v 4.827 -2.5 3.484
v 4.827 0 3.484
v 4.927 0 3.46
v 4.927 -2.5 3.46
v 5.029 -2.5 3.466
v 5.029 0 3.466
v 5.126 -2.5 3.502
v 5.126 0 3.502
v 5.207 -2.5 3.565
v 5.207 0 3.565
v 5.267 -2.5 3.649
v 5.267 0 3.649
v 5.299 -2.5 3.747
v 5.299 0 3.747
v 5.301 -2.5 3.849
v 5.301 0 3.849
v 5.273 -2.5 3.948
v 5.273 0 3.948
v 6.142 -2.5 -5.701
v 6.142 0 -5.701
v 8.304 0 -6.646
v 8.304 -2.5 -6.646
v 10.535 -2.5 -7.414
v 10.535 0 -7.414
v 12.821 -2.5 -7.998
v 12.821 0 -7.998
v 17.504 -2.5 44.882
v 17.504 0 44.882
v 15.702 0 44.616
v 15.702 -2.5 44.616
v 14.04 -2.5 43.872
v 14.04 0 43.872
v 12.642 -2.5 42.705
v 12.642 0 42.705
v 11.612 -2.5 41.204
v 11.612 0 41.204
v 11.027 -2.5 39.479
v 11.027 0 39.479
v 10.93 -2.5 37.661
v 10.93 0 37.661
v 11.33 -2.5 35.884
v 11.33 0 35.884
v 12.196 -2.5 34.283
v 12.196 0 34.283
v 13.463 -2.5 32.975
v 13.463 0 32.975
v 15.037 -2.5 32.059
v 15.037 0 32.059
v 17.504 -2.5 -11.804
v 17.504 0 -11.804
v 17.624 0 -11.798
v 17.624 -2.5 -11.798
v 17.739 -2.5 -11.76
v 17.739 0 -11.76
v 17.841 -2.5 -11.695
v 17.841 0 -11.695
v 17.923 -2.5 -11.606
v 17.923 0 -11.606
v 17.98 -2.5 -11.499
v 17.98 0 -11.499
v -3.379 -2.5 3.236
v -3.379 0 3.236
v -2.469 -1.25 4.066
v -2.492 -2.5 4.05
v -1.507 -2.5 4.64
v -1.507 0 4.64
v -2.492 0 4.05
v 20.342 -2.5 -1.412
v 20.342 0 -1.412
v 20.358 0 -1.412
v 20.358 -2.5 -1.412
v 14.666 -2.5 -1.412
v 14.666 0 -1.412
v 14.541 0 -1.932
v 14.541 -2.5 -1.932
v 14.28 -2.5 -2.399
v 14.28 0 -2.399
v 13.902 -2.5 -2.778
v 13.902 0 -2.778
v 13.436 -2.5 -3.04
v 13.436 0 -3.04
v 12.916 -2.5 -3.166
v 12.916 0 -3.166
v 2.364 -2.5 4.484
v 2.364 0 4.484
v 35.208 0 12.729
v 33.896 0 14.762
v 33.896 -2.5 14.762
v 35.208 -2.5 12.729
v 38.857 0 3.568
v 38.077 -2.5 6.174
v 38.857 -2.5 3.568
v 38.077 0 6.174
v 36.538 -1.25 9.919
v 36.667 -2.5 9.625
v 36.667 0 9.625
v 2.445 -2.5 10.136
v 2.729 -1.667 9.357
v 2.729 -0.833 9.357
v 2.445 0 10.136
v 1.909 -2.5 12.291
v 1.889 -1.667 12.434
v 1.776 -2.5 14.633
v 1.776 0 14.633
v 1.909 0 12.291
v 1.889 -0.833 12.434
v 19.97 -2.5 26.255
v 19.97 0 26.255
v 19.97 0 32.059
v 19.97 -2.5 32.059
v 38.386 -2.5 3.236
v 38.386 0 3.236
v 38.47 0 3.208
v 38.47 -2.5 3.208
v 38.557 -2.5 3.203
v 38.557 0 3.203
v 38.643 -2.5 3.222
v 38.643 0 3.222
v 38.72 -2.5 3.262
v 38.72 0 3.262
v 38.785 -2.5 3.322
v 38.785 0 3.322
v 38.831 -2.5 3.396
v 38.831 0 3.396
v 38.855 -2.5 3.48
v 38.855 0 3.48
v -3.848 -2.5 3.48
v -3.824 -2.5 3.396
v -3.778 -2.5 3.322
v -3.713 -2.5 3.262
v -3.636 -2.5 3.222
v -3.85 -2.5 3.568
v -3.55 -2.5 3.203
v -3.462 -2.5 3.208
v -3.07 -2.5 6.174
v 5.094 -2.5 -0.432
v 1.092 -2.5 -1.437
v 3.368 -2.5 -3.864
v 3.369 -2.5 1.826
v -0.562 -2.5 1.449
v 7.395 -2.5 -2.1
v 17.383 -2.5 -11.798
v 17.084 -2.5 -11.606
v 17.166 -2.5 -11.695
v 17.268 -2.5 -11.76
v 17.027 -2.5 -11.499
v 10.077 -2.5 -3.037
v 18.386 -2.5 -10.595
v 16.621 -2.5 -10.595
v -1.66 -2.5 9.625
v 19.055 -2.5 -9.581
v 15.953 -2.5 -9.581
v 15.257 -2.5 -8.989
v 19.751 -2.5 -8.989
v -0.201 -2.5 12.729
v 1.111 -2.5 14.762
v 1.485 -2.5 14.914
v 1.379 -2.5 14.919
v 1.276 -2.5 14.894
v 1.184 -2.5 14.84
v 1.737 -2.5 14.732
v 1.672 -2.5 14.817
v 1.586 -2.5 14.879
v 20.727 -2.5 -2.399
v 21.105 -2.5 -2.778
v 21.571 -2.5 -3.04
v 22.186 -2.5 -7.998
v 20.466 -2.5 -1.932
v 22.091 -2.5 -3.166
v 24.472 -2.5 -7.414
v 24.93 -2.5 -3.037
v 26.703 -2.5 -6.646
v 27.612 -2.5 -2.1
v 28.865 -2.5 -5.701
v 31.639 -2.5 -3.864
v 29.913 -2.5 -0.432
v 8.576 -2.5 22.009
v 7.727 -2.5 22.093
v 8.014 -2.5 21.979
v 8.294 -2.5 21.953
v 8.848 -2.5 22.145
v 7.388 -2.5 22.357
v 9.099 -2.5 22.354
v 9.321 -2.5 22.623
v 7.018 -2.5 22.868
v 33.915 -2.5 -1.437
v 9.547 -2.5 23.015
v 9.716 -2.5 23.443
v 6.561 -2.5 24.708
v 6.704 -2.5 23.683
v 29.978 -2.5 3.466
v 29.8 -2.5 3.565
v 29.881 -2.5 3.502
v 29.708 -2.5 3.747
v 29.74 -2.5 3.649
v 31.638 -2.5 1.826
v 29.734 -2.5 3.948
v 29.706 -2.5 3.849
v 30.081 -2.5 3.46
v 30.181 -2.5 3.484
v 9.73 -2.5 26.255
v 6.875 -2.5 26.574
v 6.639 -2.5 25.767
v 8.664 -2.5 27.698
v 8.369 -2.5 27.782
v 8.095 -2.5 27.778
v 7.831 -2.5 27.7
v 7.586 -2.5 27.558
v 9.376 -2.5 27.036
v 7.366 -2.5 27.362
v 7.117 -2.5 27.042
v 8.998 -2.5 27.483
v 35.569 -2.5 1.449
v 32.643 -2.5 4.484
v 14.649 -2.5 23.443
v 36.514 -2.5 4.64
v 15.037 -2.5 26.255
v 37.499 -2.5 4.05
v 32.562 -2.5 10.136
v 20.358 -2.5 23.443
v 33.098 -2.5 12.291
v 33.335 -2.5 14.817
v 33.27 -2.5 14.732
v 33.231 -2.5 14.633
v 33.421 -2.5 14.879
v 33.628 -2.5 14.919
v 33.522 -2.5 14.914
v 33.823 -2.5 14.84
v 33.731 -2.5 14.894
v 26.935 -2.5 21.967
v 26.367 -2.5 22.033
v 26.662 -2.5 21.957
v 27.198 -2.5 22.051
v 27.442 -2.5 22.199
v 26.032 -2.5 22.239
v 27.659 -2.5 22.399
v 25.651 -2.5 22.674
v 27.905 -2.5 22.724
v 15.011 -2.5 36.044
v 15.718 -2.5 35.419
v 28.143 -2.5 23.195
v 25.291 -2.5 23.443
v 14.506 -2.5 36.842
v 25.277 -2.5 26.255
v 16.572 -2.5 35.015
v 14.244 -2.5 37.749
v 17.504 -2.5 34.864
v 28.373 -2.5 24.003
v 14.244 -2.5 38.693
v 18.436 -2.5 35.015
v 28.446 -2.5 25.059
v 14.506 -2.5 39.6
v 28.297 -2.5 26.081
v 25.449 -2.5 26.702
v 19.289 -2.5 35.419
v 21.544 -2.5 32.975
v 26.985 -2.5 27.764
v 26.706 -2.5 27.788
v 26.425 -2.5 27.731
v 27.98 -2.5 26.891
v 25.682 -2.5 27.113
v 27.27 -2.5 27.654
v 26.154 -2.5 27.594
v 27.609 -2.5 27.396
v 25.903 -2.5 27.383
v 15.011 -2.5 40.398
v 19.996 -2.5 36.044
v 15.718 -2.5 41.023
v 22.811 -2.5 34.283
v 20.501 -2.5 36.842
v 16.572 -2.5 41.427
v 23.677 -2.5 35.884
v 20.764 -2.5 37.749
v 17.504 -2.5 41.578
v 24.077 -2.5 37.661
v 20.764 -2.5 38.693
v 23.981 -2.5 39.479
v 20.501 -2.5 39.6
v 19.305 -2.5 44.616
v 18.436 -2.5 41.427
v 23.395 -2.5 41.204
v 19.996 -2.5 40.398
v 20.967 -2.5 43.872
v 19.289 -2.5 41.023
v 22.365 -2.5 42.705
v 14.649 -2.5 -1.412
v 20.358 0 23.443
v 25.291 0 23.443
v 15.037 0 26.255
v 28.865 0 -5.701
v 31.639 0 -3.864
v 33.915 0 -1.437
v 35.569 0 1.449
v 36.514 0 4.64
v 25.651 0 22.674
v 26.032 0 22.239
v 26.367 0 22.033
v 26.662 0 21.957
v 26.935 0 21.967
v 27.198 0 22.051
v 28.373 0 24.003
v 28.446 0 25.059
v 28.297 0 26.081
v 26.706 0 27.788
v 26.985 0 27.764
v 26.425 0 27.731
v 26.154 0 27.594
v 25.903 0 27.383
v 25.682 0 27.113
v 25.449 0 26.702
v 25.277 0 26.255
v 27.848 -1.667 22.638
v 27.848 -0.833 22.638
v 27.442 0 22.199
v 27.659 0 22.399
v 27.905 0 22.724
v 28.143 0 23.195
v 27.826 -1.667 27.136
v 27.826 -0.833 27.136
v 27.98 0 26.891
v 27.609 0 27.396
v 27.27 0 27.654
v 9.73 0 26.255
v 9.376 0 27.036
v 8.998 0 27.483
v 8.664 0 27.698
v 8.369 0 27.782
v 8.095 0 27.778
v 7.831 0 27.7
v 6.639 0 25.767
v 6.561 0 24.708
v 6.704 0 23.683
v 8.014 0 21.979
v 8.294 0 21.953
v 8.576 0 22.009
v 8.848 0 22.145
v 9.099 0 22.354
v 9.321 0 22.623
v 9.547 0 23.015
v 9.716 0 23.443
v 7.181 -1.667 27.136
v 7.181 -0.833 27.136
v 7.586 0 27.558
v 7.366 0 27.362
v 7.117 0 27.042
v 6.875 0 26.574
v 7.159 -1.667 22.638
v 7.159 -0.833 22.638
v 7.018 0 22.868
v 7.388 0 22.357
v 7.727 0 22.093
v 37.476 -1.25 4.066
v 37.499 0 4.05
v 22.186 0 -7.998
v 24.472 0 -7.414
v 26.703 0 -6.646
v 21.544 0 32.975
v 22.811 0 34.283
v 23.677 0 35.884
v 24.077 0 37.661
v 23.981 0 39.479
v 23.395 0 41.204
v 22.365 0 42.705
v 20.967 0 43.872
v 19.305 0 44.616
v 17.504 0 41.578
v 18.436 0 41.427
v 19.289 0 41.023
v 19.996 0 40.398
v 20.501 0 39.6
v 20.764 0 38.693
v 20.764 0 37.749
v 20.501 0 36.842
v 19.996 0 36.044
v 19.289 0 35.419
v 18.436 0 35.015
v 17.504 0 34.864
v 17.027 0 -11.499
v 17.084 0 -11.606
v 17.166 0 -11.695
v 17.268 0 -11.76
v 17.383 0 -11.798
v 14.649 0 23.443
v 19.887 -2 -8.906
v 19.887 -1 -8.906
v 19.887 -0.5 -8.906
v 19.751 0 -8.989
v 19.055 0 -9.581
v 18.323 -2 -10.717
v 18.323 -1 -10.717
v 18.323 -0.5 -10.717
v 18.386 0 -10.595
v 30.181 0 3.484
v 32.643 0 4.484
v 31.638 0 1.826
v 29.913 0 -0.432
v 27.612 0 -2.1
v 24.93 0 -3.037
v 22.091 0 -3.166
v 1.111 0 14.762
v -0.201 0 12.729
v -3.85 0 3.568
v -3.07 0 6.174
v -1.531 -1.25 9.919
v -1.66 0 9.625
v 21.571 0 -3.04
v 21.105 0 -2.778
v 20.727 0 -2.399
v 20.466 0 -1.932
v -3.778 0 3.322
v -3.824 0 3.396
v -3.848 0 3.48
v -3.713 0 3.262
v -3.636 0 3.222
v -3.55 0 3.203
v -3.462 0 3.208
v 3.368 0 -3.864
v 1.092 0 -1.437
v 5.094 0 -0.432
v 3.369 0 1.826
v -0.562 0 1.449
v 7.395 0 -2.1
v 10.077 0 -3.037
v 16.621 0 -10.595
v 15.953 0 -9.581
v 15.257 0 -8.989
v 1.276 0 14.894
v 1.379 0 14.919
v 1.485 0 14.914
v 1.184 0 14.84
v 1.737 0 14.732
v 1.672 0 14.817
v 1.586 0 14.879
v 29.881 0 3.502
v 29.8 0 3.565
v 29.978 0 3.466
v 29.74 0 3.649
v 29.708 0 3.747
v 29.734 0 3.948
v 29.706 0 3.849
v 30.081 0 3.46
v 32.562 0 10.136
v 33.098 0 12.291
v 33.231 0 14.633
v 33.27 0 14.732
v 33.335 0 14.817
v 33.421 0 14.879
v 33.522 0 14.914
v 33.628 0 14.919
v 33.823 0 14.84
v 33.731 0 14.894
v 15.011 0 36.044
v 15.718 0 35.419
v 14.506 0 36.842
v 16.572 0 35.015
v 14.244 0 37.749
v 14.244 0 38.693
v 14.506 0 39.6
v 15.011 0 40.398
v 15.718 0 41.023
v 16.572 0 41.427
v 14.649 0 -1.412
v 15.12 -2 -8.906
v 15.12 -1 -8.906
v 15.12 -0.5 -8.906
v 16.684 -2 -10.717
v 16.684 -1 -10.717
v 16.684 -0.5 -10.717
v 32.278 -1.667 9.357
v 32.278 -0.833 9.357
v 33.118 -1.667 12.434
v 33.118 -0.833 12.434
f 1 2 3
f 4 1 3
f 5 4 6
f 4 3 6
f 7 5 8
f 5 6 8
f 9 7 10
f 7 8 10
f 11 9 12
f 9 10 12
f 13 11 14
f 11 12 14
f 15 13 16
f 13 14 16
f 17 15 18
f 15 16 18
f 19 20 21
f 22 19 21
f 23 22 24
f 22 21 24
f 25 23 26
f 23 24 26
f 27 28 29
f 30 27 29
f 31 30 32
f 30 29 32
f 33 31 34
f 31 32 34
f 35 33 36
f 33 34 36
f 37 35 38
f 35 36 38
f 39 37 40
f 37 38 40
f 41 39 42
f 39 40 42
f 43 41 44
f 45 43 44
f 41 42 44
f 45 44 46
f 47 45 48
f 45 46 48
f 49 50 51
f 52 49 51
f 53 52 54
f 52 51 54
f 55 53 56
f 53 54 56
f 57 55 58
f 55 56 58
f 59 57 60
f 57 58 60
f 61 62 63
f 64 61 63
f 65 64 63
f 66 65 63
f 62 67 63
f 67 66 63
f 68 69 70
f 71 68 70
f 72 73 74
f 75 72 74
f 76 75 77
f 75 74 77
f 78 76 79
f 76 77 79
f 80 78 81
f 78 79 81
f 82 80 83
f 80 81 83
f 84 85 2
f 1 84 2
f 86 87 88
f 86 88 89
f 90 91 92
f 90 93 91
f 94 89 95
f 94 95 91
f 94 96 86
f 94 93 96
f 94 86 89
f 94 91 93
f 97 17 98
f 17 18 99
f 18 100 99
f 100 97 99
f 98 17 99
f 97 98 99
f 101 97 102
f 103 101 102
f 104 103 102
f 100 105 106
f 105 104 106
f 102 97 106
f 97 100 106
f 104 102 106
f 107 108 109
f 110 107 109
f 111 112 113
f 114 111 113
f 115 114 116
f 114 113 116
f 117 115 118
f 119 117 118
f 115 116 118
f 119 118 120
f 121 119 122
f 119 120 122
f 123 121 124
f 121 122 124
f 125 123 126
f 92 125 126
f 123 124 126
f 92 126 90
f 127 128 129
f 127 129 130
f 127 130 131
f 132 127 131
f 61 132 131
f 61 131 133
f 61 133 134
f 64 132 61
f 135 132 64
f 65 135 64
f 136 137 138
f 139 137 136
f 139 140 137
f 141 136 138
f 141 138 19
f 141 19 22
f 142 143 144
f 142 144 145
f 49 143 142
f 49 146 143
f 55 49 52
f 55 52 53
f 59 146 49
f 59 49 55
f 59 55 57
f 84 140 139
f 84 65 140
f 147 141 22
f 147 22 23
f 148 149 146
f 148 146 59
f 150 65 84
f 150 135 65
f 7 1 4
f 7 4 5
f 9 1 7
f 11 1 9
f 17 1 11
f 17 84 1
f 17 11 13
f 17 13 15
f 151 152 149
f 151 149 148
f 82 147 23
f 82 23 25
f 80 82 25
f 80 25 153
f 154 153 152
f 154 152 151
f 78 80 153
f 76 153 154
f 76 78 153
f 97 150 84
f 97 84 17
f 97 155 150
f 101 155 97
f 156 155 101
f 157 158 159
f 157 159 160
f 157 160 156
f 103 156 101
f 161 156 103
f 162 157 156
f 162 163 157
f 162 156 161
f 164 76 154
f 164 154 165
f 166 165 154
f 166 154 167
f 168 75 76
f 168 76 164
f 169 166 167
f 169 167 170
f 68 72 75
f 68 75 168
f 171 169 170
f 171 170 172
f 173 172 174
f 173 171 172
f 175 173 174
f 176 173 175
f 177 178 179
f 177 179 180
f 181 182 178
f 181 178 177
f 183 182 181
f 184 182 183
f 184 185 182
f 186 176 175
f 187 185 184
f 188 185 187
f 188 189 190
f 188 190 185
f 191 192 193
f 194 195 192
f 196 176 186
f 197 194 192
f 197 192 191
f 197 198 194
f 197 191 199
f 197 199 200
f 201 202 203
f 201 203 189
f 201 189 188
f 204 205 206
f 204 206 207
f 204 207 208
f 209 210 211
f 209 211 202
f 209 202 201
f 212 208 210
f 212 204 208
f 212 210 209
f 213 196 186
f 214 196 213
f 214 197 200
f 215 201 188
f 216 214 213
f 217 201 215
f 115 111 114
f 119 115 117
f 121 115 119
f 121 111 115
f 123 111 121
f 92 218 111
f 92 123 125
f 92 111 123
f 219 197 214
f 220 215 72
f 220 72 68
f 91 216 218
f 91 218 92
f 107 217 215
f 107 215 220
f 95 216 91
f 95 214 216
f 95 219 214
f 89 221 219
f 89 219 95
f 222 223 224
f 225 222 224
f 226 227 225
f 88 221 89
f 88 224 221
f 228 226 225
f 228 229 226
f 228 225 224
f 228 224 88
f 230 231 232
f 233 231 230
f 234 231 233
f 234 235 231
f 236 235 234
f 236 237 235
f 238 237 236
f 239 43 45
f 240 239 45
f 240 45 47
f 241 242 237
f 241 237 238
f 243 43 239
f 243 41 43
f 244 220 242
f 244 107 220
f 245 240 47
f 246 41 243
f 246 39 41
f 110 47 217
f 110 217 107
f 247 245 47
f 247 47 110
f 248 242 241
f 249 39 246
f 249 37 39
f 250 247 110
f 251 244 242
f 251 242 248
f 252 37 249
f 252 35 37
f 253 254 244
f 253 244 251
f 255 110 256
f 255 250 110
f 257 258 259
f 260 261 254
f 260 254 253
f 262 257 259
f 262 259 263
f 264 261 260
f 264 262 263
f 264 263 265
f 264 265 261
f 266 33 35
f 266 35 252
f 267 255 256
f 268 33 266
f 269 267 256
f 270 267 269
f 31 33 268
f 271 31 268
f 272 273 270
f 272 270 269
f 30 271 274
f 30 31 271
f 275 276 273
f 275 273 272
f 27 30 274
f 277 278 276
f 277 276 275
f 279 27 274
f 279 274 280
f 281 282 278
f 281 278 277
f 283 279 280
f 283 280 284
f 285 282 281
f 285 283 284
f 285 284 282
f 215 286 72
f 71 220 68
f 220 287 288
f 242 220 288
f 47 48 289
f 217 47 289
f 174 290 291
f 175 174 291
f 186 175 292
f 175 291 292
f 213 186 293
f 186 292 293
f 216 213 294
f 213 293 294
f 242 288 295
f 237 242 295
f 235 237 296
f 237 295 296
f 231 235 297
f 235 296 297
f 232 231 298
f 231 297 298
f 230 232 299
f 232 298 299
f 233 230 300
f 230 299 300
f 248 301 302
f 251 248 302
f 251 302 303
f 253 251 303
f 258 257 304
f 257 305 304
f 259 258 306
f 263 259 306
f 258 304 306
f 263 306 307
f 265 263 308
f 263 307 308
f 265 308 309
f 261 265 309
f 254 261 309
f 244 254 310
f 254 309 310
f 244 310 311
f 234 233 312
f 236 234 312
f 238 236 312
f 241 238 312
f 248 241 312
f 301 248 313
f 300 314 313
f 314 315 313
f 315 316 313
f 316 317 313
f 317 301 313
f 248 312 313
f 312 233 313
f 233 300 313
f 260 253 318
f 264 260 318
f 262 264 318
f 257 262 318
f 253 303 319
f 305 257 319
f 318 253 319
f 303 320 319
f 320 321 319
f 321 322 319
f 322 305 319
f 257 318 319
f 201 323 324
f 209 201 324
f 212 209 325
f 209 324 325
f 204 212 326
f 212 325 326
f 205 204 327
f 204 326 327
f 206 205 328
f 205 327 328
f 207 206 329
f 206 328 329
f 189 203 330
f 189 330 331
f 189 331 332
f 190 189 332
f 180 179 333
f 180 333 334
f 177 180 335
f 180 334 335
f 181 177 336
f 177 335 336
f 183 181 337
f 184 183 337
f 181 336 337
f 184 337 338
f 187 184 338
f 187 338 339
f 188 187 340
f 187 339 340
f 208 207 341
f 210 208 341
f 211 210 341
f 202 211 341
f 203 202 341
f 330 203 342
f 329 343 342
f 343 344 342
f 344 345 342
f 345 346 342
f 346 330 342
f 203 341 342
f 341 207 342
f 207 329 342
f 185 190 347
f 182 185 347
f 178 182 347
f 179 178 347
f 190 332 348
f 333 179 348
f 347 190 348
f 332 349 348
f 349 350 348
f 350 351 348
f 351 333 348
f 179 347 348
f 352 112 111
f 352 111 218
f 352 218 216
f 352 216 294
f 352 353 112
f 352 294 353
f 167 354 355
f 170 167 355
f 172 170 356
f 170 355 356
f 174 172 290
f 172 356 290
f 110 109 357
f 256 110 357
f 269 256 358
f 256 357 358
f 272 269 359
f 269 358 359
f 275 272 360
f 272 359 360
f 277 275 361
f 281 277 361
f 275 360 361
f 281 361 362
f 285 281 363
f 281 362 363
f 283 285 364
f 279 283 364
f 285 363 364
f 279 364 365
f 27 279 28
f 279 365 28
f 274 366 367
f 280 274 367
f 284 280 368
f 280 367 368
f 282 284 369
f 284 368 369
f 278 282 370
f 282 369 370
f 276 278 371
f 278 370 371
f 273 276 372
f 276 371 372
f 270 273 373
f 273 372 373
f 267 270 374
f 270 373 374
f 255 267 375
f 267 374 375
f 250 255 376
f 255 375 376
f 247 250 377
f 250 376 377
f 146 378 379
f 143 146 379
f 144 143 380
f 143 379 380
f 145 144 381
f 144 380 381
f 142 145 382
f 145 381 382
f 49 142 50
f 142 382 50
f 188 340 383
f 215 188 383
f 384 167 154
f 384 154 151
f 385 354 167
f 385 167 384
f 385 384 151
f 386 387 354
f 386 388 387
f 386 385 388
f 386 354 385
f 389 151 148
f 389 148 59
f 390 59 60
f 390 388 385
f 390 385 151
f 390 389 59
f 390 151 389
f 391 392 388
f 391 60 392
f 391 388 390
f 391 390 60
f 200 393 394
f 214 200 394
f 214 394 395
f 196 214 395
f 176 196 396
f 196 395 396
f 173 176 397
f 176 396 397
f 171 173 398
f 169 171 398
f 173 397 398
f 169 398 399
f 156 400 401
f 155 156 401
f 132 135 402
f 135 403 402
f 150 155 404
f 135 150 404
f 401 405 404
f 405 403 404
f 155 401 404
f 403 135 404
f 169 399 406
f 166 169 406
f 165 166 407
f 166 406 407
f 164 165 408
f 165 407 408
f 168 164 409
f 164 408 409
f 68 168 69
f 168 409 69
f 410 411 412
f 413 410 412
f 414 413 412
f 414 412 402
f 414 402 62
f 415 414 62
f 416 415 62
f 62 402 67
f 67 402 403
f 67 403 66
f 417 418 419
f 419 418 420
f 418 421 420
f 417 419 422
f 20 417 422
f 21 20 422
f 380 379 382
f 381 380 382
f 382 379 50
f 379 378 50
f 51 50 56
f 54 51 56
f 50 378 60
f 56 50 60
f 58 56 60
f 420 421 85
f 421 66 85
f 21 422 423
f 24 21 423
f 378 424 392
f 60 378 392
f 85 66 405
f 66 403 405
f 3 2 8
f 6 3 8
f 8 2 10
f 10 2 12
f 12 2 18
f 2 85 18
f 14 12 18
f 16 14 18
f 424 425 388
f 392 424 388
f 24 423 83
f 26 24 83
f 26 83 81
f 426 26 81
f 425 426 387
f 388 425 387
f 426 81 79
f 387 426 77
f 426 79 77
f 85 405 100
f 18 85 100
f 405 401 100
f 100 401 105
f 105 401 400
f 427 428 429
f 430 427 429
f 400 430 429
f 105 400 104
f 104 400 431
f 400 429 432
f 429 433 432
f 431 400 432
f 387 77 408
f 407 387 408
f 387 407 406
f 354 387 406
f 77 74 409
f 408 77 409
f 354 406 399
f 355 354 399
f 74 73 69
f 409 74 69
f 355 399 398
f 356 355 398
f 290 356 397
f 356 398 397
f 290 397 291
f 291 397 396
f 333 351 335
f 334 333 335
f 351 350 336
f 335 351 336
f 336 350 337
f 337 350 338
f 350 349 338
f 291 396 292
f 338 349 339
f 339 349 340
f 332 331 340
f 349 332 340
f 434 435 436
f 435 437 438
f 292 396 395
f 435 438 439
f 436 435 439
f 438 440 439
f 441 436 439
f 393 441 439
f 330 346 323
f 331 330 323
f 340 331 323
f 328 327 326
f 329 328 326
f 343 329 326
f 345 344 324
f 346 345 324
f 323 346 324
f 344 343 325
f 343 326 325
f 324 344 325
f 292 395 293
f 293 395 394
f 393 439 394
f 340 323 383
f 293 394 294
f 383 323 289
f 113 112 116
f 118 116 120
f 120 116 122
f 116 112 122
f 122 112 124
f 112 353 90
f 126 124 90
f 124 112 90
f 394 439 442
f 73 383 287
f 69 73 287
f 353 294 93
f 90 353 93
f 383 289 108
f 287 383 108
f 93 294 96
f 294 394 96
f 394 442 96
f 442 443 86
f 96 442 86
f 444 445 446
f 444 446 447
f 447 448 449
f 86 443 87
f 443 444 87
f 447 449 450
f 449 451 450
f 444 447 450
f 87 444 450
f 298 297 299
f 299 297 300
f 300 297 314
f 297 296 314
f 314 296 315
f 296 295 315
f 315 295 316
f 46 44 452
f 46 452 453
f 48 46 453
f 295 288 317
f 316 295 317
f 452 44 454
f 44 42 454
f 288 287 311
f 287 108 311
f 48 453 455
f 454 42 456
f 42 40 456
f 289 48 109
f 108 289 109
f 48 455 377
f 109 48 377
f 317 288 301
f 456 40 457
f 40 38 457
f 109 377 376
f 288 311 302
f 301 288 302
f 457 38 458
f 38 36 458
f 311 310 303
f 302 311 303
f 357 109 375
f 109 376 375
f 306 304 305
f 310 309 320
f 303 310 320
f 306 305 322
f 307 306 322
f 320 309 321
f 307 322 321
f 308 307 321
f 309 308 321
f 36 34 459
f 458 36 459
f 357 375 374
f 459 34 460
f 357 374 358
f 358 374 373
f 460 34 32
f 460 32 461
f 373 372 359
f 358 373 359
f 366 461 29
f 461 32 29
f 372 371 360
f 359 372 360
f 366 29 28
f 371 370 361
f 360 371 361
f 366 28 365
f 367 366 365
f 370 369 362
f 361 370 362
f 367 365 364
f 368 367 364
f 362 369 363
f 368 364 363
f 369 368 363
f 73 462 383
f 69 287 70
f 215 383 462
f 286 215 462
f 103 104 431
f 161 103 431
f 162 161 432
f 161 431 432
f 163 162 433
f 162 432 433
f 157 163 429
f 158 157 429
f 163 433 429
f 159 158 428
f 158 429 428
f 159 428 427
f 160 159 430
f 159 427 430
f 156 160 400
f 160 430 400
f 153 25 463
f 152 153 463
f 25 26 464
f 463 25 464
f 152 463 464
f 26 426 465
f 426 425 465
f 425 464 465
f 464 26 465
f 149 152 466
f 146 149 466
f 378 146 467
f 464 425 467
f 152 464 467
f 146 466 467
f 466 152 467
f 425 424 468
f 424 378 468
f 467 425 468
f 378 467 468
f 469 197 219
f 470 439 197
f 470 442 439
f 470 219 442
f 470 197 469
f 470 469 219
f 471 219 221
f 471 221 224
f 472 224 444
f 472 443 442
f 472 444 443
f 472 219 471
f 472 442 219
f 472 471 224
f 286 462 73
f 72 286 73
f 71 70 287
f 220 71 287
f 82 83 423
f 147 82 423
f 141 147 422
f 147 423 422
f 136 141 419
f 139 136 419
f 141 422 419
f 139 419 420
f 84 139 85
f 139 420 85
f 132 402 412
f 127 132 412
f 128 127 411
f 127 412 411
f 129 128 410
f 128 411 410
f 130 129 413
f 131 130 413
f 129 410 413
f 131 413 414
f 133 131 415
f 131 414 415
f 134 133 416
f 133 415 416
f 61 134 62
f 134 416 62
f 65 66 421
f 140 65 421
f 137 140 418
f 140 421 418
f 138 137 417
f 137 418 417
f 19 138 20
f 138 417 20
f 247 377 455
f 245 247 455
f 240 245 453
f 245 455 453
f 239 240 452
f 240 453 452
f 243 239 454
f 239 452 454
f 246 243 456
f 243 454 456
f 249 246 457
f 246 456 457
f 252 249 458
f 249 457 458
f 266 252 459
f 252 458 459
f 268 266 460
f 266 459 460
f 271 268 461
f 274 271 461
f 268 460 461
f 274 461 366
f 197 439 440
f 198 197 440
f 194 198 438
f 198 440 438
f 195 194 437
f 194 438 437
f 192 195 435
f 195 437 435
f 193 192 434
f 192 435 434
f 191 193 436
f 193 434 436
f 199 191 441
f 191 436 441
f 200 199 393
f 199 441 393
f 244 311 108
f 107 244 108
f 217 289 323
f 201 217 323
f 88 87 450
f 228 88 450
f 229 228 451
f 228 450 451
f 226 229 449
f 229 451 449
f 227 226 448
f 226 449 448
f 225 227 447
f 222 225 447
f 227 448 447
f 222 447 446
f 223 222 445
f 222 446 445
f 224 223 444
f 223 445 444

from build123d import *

# Parameters (mm, degrees)
F1_DEPTH = 2.5


with BuildPart() as f1:
    # F0 (on Front) → F1 (new body)
    with BuildSketch(Plane.XZ):
        Polygon((19.9702170016, 32.0593795983), (15.0368500231, 32.0593795983), (15.0368500231, 26.2546902991), (9.737966444, 26.2546902991), (9.7163520504, 23.4430860728), (14.649162069, 23.4430860728), (14.649162069, -1.4119866537), (14.6655309945, -1.4119866537), (20.3415360302, -1.4119866537), (20.3579049557, -1.4119866537), (20.3579049557, 23.4430860728), (25.2907149743, 23.4430860728), (25.2767818304, 26.2546902991), (25.2691005807, 26.2546902991), (19.9702170016, 26.2546902991), align=None)
        with BuildLine():
            add(Edge.make_bspline(
                [(25.2907149743, 23.4430860728), (26.2882305831, 20.365262945), (27.8484616427, 22.637675937), (29.4086927023, 24.9100889291), (27.8261704411, 27.1358736943), (26.2436481799, 29.3616584594), (25.2767818304, 26.2546902991)],
                knots=[2.0818835057, 2.0818835057, 2.0818835057, 3.8412701203, 3.8412701203, 5.6006567348, 5.6006567348, 7.3600433494, 7.3600433494, 7.3600433494], degree=2, weights=[1, 0.6373874942, 1, 0.6373874942, 1, 0.6373874942, 1]))
            Line((25.2767818304, 26.2546902991), (25.2907149743, 23.4430860728))
        make_face()
        with BuildLine():
            ThreePointArc((19.9702170016, 32.0593795983), (23.9805343506, 39.4793828594), (17.5035335124, 44.8819335324))
            ThreePointArc((17.5035335124, 44.8819335324), (11.0265326741, 39.4793828594), (15.0368500231, 32.0593795983))
            Line((15.0368500231, 32.0593795983), (19.9702170016, 32.0593795983))
        make_face()
        with BuildLine():
            ThreePointArc((17.5035335124, 34.864031021), (14.2101902268, 38.22103329), (17.5035335124, 41.578035559))
            ThreePointArc((17.5035335124, 41.578035559), (20.796876798, 38.22103329), (17.5035335124, 34.864031021))
        make_face(mode=Mode.SUBTRACT)
        with BuildLine():
            Line((9.7163520504, 23.4430860728), (9.737966444, 26.2546902991))
            Line((9.737966444, 26.2546902991), (9.7302851943, 26.2546902991))
            add(Edge.make_bspline(
                [(9.7302851943, 26.2546902991), (8.7634188448, 29.3616584594), (7.1808965836, 27.1358736943), (5.5983743224, 24.9100889291), (7.158605382, 22.637675937), (8.7188364416, 20.365262945), (9.7163520504, 23.4430860728)],
                knots=[5.206327265, 5.206327265, 5.206327265, 6.9657138795, 6.9657138795, 8.7251004941, 8.7251004941, 10.4844871087, 10.4844871087, 10.4844871087], degree=2, weights=[1, 0.6373874942, 1, 0.6373874942, 1, 0.6373874942, 1]))
        make_face()
        with BuildLine():
            Line((20.3415360302, -1.4119866537), (14.6655309945, -1.4119866537))
            ThreePointArc((14.6655309945, -1.4119866537), (14.104262397, -2.601770472), (12.9159725396, -3.1661951243))
            ThreePointArc((12.9159725396, -3.1661951243), (6.1837849457, -1.3494681757), (2.3638433989, 4.4841321865))
            Line((2.3638433989, 4.4841321865), (-1.5069706133, 4.6396357939))
            ThreePointArc((-1.5069706133, 4.6396357939), (1.0924430649, -1.4370902061), (6.1424945269, -5.7009535458))
            ThreePointArc((6.1424945269, -5.7009535458), (9.411755425, -7.0527797683), (12.8207588568, -7.9983994365))
            add(Edge.make_bspline(
                [(12.8207588568, -7.9983994365), (13.2286113889, -8.1298598572), (14.030525637, -8.3883355957), (15.1474289659, -8.8652634772), (16.0285297181, -9.5488398221), (16.7051850381, -10.7003064264), (16.9278864722, -11.2527367175), (17.0273277909, -11.4994095638)],
                knots=[0, 0, 0, 0, 0.2115418785, 0.4159308405, 0.6130256954, 0.8272070618, 1, 1, 1, 1], degree=3))
            ThreePointArc((17.0273277909, -11.4994095638), (17.2146874841, -11.731113087), (17.5035335124, -11.8043124676))
            ThreePointArc((17.5035335124, -11.8043124676), (17.7923795406, -11.731113087), (17.9797392339, -11.4994095638))
            add(Edge.make_bspline(
                [(22.1863081679, -7.9983994365), (21.7784556358, -8.1298598572), (20.9765413877, -8.3883355957), (19.8596380588, -8.8652634772), (18.9785373066, -9.5488398221), (18.3018819866, -10.7003064264), (18.0791805525, -11.2527367175), (17.9797392339, -11.4994095638)],
                knots=[0, 0, 0, 0, 0.2115418785, 0.4159308405, 0.6130256954, 0.8272070618, 1, 1, 1, 1], degree=3))
            ThreePointArc((22.1863081679, -7.9983994365), (25.5953115998, -7.0527797683), (28.8645724978, -5.7009535458))
            ThreePointArc((28.8645724978, -5.7009535458), (33.9146239598, -1.4370902061), (36.514037638, 4.6396357939))
            Line((36.514037638, 4.6396357939), (32.6432236258, 4.4841321865))
            ThreePointArc((32.6432236258, 4.4841321865), (28.823282079, -1.3494681757), (22.0910944851, -3.1661951243))
            ThreePointArc((22.0910944851, -3.1661951243), (20.9028046278, -2.601770472), (20.3415360302, -1.4119866537))
        make_face()
        with BuildLine():
            Line((-1.5069706133, 4.6396357939), (2.3638433989, 4.4841321865))
            Line((2.3638433989, 4.4841321865), (4.8265583094, 3.4840409858))
            ThreePointArc((4.8265583094, 3.4840409858), (5.207101451, 3.5650237911), (5.2730236415, 3.9484629156))
            add(Edge.make_bspline(
                [(5.2730236415, 3.9484629156), (4.3093190608, 5.8568781898), (2.6415257191, 9.1595939302), (1.7918217485, 12.3374978629), (1.7806474113, 13.9165389117), (1.7755767331, 14.6330744028)],
                knots=[0, 0, 0, 0, 0.4277955284, 0.7403456912, 1, 1, 1, 1], degree=3))
            ThreePointArc((1.7755767331, 14.6330744028), (1.4853684877, 14.9141883565), (1.1110873893, 14.7620057687))
            add(Edge.make_bspline(
                [(1.1110873893, 14.7620057687), (0, 13.3479235297), (-1.5371329646, 9.9603936039), (-3.3933382019, 5.6264709941), (-3.8495825403, 3.5681225897)],
                knots=[0, 0, 0, 0, 0.4745849169, 1, 1, 1, 1], degree=3))
            ThreePointArc((-3.8495825403, 3.5681225897), (-3.713409423, 3.2620784428), (-3.3794315532, 3.2362923957))
            add(Edge.make_bspline(
                [(-3.3794315532, 3.2362923957), (-3.0844818323, 3.5324643819), (-2.5082629775, 4.1110710752), (-1.8354097748, 4.4662585074), (-1.5069706133, 4.6396357939)],
                knots=[0, 0, 0, 0, 0.5118709991, 1, 1, 1, 1], degree=3))
        make_face()
        with BuildLine():
            Line((30.1805087153, 3.4840409858), (32.6432236258, 4.4841321865))
            Line((32.6432236258, 4.4841321865), (36.514037638, 4.6396357939))
            add(Edge.make_bspline(
                [(38.3864985779, 3.2362923957), (38.091548857, 3.5324643819), (37.5153300022, 4.1110710752), (36.8424767996, 4.4662585074), (36.514037638, 4.6396357939)],
                knots=[0, 0, 0, 0, 0.5118709991, 1, 1, 1, 1], degree=3))
            ThreePointArc((38.3864985779, 3.2362923957), (38.7204764477, 3.2620784428), (38.856649565, 3.5681225897))
            add(Edge.make_bspline(
                [(33.8959796354, 14.7620057687), (35.0070670247, 13.3479235297), (36.5441999893, 9.9603936039), (38.4004052267, 5.6264709941), (38.856649565, 3.5681225897)],
                knots=[0, 0, 0, 0, 0.4745849169, 1, 1, 1, 1], degree=3))
            ThreePointArc((33.8959796354, 14.7620057687), (33.521698537, 14.9141883565), (33.2314902917, 14.6330744028))
            add(Edge.make_bspline(
                [(29.7340433832, 3.9484629156), (30.6977479639, 5.8568781898), (32.3655413056, 9.1595939302), (33.2152452762, 12.3374978629), (33.2264196134, 13.9165389117), (33.2314902917, 14.6330744028)],
                knots=[0, 0, 0, 0, 0.4277955284, 0.7403456912, 1, 1, 1, 1], degree=3))
            ThreePointArc((29.7340433832, 3.9484629156), (29.7999655737, 3.5650237911), (30.1805087153, 3.4840409858))
        make_face()
    extrude(amount=F1_DEPTH)


solid = f1.part
